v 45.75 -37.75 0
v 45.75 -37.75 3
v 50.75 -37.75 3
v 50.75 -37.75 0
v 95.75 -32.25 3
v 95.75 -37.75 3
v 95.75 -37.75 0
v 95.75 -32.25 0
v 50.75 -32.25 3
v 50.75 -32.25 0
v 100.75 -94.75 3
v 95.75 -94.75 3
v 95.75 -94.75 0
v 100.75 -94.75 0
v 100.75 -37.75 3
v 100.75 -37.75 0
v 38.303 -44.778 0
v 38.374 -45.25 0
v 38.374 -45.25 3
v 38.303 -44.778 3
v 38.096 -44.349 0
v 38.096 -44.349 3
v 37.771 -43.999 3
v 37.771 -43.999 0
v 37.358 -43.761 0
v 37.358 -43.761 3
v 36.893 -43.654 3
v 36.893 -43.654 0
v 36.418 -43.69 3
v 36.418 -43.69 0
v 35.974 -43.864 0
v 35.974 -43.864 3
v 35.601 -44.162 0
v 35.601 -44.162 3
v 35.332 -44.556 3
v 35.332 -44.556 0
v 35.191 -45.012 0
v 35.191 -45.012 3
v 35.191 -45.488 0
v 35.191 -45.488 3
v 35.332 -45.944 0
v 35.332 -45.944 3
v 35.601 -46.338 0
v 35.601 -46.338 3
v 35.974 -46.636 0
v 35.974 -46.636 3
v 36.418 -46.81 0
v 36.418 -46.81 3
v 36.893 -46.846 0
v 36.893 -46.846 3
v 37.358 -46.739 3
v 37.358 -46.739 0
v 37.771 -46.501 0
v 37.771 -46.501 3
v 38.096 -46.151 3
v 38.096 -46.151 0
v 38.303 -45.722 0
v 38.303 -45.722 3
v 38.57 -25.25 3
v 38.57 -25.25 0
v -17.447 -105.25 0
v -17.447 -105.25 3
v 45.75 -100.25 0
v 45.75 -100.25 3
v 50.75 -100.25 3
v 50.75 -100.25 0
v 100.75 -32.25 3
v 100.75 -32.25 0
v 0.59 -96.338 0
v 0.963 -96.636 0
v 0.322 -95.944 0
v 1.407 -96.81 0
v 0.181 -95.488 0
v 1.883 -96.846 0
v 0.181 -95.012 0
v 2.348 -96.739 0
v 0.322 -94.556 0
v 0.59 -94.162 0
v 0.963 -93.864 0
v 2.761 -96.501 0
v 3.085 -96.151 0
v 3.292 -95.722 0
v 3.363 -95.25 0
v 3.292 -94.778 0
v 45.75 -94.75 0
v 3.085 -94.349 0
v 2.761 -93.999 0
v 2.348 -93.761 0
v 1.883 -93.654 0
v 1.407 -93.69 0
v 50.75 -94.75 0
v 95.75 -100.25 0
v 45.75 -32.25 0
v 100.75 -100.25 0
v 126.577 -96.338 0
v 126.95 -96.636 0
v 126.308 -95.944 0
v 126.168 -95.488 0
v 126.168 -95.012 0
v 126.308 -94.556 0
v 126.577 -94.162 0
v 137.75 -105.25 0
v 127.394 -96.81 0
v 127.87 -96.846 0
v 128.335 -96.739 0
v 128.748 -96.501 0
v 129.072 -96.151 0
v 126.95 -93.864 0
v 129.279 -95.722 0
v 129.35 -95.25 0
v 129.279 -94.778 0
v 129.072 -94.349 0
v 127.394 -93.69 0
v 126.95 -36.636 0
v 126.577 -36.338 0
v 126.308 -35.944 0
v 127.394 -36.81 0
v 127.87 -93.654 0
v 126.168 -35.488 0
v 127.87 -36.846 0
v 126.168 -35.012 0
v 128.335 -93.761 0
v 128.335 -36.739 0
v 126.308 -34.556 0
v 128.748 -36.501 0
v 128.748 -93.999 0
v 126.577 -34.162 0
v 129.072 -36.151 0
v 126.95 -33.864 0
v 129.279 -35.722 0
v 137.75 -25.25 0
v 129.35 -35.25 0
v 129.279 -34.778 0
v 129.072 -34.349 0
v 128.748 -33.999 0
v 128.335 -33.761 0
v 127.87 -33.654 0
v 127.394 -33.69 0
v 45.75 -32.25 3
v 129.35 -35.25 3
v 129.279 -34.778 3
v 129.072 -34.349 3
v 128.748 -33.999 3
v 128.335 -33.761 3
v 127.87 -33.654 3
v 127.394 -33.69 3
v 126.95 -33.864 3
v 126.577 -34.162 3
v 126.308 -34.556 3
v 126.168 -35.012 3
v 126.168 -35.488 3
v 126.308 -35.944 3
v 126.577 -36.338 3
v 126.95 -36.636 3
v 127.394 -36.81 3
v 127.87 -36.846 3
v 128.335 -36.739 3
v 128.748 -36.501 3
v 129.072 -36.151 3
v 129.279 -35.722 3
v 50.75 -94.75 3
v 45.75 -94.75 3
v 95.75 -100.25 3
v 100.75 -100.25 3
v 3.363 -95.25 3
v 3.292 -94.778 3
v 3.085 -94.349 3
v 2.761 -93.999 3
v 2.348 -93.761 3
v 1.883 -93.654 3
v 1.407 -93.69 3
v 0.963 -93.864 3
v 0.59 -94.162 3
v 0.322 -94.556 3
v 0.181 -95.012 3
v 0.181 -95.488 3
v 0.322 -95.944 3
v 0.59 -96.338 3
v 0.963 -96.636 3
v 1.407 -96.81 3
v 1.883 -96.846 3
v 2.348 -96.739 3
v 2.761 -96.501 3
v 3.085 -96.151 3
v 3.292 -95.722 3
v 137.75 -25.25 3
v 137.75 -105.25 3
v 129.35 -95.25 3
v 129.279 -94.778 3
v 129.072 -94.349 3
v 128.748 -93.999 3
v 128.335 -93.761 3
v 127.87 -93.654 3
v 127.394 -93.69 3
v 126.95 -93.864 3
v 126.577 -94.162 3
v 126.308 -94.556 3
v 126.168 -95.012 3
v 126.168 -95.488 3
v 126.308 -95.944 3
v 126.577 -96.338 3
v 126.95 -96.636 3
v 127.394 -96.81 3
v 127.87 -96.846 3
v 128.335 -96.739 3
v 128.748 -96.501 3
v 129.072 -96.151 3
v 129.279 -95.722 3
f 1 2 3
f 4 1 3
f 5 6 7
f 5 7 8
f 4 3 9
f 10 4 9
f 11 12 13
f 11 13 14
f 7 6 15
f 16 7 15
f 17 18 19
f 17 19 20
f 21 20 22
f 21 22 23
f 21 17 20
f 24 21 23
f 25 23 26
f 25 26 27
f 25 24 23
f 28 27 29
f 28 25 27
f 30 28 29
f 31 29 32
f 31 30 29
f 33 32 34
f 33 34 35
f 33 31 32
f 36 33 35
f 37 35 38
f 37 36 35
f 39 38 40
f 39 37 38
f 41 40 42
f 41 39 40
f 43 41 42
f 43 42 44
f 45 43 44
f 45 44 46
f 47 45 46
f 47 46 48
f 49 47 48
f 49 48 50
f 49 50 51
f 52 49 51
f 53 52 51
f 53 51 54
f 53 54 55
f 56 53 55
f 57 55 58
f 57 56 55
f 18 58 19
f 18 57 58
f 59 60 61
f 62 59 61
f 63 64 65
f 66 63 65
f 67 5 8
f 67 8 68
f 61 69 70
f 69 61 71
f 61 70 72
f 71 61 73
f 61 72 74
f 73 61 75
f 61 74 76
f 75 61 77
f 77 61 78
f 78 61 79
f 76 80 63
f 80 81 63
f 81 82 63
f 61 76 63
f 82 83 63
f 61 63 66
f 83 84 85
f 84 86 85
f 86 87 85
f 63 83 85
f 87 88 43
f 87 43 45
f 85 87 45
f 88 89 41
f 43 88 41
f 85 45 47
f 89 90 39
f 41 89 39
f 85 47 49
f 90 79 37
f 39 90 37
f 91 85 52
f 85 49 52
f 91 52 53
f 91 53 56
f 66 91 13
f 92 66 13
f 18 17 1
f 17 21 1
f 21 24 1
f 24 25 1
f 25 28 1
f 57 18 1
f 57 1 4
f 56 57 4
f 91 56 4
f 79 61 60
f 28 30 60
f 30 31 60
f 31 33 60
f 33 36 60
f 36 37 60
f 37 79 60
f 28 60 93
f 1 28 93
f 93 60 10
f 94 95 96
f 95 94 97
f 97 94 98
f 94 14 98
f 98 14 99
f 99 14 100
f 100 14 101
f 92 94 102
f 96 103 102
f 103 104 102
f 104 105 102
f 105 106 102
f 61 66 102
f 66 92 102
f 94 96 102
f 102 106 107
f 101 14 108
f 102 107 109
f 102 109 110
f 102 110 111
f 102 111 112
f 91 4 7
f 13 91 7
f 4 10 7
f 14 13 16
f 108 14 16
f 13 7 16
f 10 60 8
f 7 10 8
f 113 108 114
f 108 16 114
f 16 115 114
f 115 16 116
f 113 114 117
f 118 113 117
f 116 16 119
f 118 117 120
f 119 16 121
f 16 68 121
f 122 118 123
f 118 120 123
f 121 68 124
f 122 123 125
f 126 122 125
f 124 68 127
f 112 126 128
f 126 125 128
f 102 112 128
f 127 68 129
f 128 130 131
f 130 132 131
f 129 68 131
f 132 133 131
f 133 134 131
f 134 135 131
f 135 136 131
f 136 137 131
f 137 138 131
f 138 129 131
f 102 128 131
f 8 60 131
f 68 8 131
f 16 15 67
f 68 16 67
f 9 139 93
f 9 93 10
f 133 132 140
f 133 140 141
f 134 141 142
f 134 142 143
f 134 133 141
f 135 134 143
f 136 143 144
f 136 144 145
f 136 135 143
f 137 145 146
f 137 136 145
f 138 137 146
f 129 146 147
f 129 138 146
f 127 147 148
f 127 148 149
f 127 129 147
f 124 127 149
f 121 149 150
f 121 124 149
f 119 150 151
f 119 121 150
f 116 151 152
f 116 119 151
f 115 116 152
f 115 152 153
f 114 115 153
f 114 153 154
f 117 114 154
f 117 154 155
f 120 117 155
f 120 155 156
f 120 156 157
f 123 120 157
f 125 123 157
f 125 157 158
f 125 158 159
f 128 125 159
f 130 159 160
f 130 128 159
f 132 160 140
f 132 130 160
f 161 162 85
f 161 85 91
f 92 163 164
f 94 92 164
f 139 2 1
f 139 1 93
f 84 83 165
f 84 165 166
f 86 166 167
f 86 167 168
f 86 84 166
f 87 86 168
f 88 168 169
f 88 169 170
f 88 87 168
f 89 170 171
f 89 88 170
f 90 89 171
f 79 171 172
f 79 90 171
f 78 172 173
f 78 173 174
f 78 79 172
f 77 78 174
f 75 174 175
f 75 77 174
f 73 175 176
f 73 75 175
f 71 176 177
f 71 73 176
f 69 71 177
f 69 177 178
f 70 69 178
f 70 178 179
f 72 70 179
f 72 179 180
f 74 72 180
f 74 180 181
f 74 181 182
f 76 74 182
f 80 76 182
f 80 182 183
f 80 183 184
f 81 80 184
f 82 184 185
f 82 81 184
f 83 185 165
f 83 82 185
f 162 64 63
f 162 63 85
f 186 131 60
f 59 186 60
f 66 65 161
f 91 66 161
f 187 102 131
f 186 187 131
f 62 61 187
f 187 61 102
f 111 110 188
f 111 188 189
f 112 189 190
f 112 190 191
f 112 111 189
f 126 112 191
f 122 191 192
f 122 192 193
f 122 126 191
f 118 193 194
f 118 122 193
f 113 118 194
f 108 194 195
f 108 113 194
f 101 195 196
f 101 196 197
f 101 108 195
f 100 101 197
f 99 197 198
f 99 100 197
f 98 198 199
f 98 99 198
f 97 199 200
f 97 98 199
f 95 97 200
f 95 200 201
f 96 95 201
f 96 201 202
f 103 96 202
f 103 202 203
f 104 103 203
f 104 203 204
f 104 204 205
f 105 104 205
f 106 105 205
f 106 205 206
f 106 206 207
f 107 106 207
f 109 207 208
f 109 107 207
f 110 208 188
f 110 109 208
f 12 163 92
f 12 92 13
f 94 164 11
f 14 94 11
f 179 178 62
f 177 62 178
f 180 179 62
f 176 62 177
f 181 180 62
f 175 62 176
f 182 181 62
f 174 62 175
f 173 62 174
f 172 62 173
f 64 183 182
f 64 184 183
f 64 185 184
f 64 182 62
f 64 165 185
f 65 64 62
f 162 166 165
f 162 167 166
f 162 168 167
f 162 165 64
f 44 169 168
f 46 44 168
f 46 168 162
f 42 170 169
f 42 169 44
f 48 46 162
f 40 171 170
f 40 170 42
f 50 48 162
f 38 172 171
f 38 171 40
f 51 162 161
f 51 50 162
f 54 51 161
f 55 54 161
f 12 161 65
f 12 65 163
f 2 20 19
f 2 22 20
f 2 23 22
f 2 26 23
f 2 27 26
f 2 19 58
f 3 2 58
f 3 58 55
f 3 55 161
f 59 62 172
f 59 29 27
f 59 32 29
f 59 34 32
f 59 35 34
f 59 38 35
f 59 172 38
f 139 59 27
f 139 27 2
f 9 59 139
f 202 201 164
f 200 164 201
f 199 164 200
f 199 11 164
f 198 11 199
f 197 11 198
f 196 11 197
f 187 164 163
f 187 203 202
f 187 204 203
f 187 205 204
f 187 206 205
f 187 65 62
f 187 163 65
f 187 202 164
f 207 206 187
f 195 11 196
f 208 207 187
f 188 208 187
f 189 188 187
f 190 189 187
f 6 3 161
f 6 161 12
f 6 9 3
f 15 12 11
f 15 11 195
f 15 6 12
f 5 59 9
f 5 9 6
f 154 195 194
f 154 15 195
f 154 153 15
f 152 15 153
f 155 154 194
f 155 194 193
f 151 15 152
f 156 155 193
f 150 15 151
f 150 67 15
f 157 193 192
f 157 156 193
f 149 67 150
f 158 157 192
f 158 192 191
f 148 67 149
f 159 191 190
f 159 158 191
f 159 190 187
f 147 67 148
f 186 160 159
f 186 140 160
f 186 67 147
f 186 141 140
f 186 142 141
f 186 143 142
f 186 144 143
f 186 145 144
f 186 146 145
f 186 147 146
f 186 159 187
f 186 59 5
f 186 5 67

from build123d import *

# Parameters (mm, degrees)
SKETCH_1_R             = 1.6
EXTRUDE_2_DEPTH        = 3
SKETCH_2_W             = 5
SKETCH_2_H             = 5.5
CUT_EXTRUDE_1_DEPTH    = 5
PATTERN_LINEAR_1_COUNT = 2
PATTERN_LINEAR_1_PITCH = 62.5


with BuildPart() as part:
    # 草图1 → 凸台-拉伸2 (new body)
    with BuildSketch(Plane.XY):
        Polygon((137.75, -25.25), (38.57, -25.25), (-17.446603057, -105.25), (137.75, -105.25), align=None)
        with Locations((36.773595123, -45.25)):
            Circle(SKETCH_1_R, mode=Mode.SUBTRACT)
        with Locations((1.763218213, -95.25)):
            Circle(SKETCH_1_R, mode=Mode.SUBTRACT)
        with Locations((127.75, -35.25)):
            Circle(SKETCH_1_R, mode=Mode.SUBTRACT)
        with Locations((127.75, -95.25)):
            Circle(SKETCH_1_R, mode=Mode.SUBTRACT)
    extrude(amount=EXTRUDE_2_DEPTH)

    # 草图2 → 切除-拉伸1 (cut)
    with BuildSketch(Plane.XY.offset(3)):
        with Locations((98.25, -97.500011017)):
            Rectangle(SKETCH_2_W, SKETCH_2_H)
        with Locations((48.25, -97.500011017)):
            Rectangle(SKETCH_2_W, SKETCH_2_H)
    cut_extrude_1 = extrude(amount=-CUT_EXTRUDE_1_DEPTH, mode=Mode.SUBTRACT)

    # 阵列(线性)1: 切除-拉伸1 ×2
    with Locations(*[(0, i * PATTERN_LINEAR_1_PITCH, 0) for i in range(1, PATTERN_LINEAR_1_COUNT)]):
        add(cut_extrude_1, mode=Mode.SUBTRACT)


solid = part.part
